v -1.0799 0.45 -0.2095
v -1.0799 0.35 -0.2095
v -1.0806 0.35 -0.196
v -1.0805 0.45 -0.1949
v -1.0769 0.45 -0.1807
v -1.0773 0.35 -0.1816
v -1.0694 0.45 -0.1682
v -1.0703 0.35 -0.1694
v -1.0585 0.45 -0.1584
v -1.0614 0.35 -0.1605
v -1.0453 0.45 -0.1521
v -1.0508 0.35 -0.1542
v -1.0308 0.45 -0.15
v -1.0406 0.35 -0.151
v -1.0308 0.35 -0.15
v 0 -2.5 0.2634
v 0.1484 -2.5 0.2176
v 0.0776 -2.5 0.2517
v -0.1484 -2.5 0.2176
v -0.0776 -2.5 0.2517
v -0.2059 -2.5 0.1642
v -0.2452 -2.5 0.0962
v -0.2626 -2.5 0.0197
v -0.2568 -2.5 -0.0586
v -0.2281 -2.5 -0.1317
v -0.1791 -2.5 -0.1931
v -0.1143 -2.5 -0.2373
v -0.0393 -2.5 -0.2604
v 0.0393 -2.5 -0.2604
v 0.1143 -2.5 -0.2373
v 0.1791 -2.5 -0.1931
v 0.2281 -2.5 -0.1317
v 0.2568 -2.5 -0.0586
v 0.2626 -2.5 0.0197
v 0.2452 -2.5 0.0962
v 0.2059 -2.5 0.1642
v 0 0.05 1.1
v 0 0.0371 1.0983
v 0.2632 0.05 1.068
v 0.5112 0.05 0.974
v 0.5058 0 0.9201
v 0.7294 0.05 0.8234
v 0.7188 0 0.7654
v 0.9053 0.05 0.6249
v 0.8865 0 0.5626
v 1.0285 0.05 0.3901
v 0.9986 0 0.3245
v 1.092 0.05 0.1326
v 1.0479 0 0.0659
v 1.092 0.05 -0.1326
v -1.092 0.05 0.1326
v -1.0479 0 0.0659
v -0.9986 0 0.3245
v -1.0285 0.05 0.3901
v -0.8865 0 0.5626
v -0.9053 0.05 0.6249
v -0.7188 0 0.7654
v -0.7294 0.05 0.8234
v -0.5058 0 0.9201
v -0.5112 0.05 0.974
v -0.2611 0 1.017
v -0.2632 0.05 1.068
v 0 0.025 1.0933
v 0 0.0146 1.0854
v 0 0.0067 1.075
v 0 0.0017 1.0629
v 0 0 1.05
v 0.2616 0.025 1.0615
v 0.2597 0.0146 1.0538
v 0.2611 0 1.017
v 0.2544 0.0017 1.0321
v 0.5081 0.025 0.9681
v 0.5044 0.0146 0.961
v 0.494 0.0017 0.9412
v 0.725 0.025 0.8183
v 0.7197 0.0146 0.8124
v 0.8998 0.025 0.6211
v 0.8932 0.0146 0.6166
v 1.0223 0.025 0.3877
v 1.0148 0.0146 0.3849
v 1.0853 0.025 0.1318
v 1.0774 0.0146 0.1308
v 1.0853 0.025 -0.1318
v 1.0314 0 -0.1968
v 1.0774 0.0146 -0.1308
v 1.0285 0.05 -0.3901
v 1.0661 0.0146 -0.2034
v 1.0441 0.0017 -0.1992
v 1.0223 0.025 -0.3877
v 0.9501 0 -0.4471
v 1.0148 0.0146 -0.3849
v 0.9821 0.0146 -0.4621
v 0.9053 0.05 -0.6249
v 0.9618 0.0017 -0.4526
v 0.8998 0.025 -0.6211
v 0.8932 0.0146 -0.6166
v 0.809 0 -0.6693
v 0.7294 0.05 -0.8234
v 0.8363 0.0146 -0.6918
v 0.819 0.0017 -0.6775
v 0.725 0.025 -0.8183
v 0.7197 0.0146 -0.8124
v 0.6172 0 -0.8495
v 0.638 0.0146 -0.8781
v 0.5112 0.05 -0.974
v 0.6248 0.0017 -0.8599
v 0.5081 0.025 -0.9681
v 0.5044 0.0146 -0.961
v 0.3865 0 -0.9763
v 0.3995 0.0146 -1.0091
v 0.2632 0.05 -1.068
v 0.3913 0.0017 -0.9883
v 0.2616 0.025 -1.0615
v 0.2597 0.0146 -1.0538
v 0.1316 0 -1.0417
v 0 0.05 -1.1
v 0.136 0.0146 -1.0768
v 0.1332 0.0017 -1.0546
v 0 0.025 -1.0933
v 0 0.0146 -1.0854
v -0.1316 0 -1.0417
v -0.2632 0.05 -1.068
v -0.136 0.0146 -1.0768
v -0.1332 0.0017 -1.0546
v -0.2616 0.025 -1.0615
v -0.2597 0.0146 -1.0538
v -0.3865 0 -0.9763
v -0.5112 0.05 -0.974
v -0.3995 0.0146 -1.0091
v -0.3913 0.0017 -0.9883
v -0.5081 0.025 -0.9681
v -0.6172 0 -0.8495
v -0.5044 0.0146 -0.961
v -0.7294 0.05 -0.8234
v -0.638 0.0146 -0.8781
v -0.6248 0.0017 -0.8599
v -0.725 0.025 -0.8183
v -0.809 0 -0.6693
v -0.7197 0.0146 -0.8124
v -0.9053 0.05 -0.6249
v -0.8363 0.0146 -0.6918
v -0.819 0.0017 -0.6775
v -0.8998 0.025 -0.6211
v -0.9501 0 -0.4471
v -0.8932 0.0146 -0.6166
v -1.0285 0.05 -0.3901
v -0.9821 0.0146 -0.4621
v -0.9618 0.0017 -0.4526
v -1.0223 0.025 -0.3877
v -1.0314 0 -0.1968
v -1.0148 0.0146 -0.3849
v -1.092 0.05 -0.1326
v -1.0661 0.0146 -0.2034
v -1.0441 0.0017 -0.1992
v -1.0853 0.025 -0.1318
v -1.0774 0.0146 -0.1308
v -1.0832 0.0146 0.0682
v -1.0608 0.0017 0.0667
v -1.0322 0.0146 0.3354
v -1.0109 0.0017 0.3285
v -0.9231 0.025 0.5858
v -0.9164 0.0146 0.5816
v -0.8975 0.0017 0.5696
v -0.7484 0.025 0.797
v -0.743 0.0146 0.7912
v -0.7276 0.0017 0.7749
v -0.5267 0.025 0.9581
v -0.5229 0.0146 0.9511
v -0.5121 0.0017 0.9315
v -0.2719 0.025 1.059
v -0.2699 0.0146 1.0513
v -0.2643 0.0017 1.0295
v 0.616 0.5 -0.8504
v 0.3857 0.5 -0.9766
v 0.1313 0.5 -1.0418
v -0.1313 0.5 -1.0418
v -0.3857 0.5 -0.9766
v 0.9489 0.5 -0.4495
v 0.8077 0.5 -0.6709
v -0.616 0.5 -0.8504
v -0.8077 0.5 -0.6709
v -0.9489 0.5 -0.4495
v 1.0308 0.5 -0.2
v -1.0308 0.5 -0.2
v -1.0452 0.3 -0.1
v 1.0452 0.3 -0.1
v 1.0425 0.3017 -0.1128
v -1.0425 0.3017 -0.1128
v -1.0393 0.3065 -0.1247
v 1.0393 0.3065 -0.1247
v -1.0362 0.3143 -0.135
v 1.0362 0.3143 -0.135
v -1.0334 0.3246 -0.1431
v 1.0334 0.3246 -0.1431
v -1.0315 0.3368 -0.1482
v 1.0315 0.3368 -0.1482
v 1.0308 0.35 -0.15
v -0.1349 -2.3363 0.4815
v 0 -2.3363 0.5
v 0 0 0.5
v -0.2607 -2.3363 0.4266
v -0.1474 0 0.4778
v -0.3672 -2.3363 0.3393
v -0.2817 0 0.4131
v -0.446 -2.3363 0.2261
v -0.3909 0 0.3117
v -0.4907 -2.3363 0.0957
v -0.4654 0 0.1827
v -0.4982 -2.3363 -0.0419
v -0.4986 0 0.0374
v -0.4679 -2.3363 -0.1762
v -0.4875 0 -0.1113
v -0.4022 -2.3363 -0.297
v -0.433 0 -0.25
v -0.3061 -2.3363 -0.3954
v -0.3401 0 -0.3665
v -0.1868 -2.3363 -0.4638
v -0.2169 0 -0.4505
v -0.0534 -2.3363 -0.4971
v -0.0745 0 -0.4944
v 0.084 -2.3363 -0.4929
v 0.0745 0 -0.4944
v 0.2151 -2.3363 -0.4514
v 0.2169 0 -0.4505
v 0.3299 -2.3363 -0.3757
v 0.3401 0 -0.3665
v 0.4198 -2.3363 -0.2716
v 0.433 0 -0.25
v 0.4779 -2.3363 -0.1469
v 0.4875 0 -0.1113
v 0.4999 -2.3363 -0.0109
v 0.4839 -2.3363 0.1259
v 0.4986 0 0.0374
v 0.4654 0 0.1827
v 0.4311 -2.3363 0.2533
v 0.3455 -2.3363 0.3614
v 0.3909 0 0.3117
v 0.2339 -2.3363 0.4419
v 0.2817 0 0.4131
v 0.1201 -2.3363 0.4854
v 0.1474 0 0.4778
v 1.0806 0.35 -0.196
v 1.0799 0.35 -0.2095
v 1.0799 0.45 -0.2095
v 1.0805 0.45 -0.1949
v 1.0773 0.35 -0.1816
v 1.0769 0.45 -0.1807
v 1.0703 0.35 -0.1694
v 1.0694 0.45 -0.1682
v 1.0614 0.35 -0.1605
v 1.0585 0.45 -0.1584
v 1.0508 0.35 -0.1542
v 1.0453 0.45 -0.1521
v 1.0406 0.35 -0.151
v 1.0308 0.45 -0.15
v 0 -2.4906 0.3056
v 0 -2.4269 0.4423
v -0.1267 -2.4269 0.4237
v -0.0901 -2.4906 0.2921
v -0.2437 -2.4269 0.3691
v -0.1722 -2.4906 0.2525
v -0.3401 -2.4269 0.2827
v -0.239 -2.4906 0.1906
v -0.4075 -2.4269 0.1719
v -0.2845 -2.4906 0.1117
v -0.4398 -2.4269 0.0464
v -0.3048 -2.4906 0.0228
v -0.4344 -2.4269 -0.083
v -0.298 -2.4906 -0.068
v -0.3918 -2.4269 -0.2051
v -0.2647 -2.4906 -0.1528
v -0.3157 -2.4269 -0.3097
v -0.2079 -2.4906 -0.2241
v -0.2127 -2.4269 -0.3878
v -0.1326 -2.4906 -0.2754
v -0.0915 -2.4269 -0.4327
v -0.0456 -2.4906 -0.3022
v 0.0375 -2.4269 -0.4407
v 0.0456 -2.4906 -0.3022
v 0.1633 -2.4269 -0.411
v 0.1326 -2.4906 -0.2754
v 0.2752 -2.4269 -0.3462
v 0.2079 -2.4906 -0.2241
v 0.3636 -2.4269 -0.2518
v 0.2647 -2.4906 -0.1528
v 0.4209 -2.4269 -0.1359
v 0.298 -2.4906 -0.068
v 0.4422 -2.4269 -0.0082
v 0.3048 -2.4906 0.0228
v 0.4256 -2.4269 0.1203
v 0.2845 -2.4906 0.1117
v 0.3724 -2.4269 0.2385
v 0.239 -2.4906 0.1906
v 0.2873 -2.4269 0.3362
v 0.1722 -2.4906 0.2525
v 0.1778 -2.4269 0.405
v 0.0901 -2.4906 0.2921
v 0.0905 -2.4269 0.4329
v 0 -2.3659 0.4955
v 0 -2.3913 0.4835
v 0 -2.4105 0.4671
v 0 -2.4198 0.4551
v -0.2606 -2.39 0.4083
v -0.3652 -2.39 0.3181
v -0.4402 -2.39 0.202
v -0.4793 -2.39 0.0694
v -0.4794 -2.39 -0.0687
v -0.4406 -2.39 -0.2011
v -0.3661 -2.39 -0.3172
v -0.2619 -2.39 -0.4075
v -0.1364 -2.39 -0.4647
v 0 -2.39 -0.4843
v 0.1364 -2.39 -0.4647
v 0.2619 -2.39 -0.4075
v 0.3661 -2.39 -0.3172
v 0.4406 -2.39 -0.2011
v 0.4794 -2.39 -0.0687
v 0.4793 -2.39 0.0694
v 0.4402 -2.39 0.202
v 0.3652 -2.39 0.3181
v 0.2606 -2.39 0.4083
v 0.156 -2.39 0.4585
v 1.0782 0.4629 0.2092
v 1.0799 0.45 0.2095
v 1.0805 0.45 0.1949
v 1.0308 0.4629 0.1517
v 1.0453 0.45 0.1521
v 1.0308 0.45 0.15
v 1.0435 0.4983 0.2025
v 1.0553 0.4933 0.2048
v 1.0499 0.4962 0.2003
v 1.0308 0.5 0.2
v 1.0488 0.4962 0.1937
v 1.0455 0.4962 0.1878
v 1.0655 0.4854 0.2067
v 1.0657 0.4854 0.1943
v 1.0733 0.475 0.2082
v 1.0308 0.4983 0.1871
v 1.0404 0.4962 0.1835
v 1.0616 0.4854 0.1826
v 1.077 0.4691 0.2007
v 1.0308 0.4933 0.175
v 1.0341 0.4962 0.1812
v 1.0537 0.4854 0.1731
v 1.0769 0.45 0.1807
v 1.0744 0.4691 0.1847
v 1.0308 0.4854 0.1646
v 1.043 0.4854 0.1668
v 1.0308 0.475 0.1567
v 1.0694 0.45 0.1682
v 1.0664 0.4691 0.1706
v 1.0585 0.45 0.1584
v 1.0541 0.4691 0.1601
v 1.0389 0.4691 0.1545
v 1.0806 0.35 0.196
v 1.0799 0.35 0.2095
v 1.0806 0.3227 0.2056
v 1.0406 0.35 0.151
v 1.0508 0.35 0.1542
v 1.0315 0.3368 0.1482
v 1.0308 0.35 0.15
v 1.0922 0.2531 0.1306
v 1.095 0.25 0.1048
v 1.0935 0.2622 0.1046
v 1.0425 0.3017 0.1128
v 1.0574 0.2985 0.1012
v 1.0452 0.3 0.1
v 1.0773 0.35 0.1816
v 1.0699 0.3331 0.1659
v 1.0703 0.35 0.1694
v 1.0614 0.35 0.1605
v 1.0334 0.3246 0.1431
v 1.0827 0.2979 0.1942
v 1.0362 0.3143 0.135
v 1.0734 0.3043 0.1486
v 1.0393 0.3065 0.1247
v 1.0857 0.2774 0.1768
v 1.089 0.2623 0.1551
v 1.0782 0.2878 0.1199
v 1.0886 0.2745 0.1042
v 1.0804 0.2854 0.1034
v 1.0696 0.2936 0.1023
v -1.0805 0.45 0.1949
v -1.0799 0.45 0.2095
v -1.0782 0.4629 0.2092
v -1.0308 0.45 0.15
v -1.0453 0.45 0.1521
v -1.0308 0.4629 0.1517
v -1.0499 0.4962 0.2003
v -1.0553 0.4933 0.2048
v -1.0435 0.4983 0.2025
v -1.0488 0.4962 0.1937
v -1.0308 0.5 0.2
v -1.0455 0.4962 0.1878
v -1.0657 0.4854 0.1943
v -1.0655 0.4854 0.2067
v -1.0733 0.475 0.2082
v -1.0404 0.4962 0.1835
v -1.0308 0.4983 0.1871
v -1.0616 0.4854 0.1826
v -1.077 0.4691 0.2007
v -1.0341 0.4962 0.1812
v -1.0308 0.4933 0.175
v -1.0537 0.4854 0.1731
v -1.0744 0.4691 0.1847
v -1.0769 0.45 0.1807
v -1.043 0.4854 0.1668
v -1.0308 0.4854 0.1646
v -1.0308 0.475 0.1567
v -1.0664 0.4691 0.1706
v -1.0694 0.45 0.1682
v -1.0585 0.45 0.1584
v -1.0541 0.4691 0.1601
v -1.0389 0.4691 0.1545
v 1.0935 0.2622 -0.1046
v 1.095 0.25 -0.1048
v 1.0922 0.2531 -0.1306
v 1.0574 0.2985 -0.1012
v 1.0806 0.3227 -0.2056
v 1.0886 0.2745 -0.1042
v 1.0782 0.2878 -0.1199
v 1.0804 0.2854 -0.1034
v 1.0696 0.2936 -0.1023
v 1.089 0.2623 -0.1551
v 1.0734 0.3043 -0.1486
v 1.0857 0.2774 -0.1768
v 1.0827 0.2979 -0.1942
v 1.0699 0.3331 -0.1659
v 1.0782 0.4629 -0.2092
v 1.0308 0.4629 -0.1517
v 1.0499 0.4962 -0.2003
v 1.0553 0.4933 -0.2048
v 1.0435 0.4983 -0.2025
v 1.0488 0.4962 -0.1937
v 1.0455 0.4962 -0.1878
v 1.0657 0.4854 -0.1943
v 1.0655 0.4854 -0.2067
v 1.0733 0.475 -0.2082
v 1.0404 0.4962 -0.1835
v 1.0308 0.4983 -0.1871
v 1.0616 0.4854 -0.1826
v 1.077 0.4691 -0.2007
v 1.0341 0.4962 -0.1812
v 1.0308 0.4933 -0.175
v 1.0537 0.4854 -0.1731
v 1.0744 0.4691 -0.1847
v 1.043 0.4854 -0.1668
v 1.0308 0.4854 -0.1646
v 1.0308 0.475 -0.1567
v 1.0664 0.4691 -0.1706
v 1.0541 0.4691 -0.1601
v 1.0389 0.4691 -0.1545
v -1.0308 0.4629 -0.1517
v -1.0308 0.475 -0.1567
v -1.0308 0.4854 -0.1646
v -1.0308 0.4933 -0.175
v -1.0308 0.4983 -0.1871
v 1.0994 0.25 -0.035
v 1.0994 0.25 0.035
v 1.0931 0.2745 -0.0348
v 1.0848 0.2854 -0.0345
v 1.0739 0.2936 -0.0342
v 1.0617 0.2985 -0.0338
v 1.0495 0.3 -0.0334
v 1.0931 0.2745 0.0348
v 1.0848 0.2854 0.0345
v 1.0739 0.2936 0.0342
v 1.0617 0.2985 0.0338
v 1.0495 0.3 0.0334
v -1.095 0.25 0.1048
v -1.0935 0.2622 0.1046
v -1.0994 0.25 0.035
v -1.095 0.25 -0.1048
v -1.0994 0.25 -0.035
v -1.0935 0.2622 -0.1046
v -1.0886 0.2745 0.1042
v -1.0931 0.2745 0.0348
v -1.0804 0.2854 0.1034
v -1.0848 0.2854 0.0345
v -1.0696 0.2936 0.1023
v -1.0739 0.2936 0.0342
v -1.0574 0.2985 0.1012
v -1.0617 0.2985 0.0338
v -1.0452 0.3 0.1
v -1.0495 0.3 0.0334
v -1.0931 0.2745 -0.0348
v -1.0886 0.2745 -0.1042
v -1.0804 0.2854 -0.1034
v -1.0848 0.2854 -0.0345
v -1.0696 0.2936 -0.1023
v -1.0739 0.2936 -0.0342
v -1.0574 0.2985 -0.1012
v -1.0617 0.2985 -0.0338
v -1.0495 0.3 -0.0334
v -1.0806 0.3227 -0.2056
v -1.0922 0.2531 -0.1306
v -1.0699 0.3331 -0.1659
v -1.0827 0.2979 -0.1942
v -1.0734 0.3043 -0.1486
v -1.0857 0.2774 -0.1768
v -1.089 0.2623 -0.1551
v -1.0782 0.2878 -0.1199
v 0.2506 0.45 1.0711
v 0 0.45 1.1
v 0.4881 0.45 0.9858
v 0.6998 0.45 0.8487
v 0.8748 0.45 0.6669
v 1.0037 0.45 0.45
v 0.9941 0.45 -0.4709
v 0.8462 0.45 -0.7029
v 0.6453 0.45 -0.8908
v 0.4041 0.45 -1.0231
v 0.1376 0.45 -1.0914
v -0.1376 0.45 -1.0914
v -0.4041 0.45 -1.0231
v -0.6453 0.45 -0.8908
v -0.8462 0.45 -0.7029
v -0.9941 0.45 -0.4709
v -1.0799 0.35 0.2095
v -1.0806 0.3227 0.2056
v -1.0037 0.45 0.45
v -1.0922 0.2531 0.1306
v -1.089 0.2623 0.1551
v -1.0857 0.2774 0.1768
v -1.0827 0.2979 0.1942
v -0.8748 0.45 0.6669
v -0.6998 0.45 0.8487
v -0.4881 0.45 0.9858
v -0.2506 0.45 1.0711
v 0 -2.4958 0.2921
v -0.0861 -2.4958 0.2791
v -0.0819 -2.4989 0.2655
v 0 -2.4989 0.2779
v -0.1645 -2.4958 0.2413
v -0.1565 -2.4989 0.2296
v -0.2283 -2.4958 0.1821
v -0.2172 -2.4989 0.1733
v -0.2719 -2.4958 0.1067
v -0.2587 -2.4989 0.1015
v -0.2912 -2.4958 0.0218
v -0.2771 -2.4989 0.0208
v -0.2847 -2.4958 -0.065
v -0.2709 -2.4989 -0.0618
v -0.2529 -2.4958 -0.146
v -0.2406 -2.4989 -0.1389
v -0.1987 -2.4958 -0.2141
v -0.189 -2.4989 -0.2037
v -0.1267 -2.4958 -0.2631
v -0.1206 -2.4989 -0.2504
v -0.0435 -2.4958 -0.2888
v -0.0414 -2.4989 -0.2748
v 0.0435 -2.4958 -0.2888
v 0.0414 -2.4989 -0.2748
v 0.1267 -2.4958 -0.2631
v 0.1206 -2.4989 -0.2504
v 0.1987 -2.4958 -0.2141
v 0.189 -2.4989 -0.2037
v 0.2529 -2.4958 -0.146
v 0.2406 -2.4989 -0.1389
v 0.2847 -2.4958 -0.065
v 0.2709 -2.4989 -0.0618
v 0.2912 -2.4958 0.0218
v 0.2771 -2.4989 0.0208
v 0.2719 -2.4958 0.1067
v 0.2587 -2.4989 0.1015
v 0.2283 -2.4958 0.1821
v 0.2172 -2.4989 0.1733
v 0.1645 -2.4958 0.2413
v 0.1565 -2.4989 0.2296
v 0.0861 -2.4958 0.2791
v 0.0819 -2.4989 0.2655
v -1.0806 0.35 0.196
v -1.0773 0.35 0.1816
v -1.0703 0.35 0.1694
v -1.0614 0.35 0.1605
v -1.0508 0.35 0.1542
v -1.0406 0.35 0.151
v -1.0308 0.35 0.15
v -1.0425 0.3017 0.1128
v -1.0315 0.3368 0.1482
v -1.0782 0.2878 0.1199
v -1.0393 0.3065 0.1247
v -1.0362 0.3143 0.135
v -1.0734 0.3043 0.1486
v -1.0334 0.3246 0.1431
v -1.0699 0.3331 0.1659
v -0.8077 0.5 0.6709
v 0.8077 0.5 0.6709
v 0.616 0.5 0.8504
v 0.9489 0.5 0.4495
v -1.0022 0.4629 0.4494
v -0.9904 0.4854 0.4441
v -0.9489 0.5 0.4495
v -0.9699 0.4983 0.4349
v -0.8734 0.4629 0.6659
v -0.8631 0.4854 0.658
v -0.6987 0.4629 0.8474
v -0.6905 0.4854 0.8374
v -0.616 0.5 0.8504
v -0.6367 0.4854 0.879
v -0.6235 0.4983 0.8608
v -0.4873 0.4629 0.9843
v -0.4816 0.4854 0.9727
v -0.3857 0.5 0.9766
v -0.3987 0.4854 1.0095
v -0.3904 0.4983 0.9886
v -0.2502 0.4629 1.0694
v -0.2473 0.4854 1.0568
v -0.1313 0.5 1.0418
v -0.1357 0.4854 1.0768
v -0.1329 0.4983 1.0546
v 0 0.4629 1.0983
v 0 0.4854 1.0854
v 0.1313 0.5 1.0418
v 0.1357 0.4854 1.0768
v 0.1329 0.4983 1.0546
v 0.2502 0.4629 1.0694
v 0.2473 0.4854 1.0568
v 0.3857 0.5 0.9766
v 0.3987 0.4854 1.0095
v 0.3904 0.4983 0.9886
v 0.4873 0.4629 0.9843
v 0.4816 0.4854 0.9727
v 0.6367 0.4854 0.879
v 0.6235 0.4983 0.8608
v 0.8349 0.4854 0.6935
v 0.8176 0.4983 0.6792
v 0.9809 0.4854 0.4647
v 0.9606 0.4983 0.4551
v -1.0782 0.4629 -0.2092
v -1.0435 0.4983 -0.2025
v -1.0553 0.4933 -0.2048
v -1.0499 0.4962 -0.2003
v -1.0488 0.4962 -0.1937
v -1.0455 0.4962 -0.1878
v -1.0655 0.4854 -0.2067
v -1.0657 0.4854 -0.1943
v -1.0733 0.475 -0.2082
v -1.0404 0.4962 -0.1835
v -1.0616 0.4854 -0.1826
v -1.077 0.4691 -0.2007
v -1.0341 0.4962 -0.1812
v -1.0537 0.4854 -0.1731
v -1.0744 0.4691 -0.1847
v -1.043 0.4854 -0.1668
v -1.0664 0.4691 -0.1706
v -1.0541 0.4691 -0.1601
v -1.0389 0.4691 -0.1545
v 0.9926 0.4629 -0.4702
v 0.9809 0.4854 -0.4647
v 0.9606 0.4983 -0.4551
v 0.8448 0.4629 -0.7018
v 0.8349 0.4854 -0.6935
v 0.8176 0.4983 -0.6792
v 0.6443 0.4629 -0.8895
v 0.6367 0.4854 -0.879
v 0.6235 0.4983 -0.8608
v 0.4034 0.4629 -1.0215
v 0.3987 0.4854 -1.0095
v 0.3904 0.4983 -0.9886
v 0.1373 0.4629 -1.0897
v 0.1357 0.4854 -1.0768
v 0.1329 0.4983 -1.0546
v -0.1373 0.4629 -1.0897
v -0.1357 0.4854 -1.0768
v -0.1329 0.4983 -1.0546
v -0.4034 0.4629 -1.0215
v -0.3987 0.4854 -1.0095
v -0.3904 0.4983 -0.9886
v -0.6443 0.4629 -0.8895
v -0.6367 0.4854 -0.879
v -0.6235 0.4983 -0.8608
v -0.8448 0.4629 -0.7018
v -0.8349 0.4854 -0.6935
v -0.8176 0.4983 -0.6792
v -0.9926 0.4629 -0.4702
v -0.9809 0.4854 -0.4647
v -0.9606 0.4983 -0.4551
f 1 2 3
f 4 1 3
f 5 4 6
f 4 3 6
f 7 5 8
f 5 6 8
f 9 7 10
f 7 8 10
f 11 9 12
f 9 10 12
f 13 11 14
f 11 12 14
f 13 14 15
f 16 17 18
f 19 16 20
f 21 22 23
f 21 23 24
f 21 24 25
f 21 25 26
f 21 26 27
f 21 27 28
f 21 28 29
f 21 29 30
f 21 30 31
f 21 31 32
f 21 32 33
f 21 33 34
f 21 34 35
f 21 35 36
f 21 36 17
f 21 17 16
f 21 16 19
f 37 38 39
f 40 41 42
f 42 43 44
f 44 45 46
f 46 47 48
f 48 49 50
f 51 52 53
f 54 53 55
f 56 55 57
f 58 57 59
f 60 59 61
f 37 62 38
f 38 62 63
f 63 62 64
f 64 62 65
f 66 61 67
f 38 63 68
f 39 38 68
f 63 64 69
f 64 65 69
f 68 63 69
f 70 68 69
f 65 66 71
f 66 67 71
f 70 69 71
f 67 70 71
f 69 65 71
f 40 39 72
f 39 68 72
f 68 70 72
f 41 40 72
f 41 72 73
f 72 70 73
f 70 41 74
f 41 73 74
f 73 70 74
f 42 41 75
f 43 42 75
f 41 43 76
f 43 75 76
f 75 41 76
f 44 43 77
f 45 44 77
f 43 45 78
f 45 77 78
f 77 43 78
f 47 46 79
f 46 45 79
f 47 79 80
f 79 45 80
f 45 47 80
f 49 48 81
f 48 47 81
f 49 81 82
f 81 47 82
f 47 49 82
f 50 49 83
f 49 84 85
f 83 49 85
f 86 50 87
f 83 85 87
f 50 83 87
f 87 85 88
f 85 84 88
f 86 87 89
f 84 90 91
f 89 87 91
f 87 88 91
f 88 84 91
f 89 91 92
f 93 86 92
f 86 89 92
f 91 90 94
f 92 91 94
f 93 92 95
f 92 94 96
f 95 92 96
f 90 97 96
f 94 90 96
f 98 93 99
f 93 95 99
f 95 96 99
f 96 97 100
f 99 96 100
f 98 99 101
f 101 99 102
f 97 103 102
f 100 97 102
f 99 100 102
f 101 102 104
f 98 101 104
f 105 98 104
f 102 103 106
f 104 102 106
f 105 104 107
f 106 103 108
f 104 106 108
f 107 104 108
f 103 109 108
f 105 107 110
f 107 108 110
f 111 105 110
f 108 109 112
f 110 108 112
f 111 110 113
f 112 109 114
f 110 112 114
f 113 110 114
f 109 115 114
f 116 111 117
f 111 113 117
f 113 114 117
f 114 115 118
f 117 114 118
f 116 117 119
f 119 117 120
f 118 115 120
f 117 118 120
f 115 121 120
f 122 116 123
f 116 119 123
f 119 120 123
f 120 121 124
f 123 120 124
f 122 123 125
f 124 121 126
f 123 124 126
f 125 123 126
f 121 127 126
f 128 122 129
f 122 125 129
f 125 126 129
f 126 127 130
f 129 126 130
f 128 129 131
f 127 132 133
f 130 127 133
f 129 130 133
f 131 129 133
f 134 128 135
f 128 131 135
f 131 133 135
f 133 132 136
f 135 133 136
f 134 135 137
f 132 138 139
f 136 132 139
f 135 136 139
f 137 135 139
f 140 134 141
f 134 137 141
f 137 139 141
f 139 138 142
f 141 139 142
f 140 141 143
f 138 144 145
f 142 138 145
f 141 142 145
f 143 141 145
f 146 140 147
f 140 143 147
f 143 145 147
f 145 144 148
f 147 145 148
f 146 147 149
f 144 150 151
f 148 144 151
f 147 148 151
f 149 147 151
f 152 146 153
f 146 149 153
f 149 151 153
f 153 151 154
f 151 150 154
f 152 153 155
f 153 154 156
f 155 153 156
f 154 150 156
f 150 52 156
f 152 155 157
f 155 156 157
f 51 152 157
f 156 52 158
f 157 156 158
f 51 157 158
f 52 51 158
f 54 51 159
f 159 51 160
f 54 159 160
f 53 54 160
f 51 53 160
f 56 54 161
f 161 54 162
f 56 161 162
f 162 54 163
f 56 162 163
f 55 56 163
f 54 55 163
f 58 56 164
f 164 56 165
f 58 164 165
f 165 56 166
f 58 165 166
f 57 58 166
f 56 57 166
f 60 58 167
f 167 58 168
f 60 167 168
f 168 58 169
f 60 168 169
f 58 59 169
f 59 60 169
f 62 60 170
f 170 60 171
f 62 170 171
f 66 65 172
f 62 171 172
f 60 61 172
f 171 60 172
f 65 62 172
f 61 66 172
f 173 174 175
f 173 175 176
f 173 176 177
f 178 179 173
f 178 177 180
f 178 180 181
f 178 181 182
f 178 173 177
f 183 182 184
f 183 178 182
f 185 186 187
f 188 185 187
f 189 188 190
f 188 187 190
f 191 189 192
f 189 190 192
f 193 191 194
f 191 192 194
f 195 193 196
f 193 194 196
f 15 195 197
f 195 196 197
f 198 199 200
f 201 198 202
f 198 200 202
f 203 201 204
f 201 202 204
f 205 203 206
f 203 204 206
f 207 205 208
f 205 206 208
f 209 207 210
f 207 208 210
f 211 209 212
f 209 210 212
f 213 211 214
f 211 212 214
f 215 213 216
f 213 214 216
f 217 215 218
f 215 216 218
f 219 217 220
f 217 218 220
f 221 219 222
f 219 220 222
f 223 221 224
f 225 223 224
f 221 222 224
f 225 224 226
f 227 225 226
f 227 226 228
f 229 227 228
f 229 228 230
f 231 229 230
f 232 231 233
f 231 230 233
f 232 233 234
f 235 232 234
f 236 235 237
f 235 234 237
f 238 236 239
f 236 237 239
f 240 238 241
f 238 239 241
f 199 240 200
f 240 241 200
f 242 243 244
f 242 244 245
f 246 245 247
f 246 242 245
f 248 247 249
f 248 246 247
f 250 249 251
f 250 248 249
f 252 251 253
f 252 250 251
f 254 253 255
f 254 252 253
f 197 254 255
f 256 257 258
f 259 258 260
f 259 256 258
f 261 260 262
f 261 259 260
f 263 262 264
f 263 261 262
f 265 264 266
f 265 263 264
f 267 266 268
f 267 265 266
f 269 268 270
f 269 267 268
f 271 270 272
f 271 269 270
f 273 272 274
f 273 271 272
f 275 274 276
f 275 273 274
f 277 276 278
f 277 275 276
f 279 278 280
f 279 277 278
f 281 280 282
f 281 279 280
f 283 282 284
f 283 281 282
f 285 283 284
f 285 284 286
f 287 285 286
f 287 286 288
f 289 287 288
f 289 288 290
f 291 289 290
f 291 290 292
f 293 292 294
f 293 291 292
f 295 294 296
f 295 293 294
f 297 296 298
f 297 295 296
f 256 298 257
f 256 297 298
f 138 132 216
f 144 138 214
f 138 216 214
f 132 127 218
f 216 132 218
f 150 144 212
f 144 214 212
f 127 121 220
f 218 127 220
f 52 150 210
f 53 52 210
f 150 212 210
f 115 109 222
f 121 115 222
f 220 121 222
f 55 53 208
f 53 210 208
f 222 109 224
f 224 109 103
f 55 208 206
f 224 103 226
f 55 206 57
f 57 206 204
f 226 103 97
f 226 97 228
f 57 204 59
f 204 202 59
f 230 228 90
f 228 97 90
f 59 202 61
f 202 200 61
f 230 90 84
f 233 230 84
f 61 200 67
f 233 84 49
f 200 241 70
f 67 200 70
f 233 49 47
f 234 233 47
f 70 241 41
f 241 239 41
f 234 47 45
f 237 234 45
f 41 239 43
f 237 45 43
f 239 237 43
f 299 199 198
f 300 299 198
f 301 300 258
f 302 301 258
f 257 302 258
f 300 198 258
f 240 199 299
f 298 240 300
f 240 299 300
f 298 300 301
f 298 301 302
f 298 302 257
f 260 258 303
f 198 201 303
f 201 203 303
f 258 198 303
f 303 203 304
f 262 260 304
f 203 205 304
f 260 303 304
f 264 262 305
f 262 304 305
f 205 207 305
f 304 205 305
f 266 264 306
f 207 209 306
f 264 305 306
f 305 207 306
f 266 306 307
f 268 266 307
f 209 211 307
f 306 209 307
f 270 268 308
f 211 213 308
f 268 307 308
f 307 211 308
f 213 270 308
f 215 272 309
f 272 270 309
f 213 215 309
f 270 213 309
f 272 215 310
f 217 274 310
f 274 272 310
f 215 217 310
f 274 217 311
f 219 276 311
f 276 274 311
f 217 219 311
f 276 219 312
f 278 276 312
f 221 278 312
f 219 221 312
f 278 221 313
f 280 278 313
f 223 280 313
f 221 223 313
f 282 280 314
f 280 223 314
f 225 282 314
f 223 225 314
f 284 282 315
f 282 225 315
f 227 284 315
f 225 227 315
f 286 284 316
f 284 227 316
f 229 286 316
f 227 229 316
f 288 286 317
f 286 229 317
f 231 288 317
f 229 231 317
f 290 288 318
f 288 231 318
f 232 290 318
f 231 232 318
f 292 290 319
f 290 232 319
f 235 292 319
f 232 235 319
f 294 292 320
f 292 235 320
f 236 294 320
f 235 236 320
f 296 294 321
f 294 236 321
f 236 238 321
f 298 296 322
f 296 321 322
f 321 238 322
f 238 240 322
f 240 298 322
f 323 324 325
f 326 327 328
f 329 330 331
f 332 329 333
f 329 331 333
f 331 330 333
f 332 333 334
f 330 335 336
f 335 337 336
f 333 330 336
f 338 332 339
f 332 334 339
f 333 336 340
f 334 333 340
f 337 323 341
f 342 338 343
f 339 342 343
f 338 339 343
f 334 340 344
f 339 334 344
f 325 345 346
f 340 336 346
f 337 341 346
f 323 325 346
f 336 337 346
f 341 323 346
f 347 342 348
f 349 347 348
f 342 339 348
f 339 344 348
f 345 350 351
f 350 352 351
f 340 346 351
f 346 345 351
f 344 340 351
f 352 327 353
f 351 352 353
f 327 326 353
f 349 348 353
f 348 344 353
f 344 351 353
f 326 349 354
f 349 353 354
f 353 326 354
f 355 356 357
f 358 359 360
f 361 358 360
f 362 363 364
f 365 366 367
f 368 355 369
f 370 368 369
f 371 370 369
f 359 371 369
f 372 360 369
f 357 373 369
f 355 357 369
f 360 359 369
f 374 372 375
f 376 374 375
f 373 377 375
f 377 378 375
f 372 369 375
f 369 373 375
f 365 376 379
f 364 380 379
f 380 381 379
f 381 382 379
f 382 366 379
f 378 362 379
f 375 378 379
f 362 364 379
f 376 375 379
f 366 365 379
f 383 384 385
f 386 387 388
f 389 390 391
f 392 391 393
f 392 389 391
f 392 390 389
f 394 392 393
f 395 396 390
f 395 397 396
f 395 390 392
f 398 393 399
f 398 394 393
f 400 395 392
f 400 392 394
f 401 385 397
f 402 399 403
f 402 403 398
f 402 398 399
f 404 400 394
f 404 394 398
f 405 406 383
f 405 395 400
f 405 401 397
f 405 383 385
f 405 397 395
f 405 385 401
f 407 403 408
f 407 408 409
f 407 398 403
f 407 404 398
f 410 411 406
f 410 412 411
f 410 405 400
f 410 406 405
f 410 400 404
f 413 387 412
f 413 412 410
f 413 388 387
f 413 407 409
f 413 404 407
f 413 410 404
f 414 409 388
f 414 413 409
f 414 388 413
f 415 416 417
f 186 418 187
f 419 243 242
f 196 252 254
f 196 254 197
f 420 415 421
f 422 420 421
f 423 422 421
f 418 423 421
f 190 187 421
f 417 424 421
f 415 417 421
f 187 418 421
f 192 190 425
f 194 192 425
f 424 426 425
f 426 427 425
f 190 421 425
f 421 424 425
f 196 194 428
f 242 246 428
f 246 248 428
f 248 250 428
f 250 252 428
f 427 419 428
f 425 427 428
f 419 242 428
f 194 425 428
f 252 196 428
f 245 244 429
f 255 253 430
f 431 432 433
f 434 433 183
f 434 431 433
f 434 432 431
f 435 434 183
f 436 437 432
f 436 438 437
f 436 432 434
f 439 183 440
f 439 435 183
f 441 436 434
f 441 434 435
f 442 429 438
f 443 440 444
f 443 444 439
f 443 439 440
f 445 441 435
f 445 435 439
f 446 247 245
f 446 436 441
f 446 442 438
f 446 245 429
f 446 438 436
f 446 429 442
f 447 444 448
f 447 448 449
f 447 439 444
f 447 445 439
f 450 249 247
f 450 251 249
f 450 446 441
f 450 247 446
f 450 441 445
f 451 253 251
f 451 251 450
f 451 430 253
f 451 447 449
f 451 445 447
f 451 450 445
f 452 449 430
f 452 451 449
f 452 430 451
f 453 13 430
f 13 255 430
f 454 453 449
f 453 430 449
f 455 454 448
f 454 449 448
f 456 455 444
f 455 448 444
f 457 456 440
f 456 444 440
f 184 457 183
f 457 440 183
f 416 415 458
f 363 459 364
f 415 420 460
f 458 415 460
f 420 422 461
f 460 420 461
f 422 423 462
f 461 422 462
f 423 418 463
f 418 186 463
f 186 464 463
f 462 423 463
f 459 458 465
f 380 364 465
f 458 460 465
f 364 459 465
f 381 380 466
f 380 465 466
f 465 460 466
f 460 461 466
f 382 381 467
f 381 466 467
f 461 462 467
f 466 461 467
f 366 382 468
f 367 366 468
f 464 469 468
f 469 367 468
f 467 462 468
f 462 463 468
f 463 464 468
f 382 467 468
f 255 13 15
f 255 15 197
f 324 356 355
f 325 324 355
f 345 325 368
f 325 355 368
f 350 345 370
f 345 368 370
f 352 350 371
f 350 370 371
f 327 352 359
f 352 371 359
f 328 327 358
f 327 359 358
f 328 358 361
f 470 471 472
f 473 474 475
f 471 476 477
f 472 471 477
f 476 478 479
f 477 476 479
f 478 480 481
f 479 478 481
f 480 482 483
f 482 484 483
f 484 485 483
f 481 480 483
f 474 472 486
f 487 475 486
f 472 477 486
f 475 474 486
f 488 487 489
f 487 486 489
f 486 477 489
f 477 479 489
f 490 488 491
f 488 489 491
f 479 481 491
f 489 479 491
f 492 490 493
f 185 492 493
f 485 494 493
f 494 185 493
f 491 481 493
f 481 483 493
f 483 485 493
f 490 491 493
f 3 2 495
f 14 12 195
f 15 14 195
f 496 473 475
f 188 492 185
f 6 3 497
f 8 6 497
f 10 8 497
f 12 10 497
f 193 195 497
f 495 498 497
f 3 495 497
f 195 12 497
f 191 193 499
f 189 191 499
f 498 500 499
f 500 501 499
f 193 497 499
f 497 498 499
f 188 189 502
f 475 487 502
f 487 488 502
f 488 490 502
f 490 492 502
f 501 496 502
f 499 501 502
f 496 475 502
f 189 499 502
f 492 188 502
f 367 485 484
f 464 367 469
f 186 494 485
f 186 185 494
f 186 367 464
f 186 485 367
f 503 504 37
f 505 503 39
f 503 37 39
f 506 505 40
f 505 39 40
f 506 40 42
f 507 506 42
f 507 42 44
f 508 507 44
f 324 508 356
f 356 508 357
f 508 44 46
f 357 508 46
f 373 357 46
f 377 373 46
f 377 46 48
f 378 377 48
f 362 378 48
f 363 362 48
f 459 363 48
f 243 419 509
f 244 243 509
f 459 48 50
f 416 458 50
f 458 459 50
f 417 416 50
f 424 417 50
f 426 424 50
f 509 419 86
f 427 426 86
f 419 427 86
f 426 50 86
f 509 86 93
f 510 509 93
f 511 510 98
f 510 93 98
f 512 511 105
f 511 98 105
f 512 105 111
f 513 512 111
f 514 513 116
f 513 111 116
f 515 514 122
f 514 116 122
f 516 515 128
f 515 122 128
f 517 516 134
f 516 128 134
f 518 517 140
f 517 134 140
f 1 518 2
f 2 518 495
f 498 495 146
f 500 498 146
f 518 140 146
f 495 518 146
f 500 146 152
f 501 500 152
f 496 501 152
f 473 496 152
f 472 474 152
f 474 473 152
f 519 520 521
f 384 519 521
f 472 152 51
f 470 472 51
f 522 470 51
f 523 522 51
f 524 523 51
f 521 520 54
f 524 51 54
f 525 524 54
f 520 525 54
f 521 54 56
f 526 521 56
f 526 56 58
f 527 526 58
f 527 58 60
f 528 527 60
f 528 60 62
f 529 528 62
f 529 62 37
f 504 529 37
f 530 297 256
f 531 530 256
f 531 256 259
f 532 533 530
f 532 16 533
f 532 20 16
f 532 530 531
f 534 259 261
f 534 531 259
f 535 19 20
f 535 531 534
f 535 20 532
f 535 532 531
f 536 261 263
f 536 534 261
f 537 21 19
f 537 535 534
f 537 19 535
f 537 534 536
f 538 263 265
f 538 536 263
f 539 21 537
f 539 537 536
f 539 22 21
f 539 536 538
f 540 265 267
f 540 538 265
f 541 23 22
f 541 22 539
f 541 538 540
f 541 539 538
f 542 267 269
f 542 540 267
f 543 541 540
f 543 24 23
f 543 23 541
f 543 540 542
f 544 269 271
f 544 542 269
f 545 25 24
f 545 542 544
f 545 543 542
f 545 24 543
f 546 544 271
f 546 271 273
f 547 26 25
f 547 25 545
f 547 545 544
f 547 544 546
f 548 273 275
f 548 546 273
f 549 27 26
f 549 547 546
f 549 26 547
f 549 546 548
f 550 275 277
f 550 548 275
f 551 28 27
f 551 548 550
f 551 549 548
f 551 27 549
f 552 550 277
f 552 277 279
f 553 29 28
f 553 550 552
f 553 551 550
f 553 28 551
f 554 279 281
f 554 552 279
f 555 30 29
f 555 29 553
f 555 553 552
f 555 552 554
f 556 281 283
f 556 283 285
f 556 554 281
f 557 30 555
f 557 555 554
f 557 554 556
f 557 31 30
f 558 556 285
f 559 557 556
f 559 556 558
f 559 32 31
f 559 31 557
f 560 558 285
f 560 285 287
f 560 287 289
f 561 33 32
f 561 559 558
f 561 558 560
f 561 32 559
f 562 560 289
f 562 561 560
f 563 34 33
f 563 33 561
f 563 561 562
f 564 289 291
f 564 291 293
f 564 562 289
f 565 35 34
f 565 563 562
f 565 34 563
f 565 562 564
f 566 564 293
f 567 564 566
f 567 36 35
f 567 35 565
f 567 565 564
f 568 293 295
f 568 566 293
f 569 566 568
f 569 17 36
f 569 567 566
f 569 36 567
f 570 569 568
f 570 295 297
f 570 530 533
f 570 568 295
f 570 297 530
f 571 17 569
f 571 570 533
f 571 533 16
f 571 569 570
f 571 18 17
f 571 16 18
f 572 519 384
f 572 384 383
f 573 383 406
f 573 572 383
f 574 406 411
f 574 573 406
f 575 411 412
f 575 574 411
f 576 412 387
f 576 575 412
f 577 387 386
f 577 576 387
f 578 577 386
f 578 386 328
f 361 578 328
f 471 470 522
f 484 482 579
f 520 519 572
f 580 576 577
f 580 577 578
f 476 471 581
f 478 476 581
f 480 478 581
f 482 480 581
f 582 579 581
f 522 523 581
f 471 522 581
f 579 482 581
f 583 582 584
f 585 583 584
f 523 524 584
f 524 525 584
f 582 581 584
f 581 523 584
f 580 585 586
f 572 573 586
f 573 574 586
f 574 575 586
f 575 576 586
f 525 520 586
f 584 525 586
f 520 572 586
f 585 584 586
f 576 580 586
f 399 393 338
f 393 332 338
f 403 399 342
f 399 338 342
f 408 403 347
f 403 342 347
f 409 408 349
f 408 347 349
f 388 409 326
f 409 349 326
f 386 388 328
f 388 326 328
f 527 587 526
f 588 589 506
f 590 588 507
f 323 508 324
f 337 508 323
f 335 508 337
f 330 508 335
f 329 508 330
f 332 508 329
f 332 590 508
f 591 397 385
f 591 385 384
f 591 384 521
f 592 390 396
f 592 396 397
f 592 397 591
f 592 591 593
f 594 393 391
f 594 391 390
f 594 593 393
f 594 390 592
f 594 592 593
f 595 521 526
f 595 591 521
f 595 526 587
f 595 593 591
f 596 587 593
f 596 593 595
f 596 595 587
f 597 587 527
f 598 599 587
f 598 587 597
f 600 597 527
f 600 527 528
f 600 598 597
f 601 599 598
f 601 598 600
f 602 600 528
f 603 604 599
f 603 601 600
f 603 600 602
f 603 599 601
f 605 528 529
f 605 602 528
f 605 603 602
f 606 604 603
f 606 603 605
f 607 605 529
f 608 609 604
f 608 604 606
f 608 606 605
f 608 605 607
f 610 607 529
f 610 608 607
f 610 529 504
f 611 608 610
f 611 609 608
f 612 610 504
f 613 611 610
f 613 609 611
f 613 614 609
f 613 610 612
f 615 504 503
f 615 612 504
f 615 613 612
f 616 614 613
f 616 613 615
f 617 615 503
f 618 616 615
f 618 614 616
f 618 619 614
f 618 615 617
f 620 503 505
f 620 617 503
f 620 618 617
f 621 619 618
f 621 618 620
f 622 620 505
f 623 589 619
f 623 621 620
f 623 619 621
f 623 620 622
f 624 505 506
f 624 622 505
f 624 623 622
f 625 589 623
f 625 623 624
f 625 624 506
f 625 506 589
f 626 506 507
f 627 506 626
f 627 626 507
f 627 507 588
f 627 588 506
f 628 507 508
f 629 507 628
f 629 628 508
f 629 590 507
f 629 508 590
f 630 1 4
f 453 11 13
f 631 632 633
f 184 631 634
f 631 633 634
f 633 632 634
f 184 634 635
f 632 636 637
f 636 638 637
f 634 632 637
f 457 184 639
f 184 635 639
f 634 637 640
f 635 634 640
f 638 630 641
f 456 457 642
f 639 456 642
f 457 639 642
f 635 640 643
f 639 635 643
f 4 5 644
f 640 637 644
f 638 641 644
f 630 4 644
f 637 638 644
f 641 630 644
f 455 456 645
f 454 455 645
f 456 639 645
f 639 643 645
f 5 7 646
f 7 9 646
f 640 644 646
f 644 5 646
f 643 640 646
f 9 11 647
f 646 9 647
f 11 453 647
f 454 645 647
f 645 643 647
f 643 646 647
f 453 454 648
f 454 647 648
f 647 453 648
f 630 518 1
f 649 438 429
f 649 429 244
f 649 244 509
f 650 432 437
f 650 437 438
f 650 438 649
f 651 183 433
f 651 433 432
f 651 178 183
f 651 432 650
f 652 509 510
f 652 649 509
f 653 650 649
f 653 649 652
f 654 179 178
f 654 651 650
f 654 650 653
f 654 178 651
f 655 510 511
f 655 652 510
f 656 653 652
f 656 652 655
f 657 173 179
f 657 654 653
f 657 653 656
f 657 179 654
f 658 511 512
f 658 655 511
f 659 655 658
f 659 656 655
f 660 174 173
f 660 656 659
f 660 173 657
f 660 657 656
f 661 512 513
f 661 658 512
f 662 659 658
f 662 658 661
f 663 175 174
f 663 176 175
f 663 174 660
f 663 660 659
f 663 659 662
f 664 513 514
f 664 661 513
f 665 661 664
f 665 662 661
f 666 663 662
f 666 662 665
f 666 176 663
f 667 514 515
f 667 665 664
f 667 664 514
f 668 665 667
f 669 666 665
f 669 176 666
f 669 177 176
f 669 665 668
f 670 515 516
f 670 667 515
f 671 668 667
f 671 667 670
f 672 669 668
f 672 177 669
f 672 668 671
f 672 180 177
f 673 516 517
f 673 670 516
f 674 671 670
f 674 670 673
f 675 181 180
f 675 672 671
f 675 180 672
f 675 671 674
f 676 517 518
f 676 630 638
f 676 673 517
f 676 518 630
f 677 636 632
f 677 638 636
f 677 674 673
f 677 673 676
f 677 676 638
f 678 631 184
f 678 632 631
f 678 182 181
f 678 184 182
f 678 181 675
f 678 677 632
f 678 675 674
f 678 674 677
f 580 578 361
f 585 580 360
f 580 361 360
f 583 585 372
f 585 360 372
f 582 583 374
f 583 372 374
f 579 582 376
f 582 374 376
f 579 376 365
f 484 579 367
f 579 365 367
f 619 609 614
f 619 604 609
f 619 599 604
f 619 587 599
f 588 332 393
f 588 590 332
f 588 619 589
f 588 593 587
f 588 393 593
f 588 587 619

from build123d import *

# Parameters (mm, degrees)
SKETCH1_R           = 1.1
BOSS_EXTRUDE1_DEPTH = 0.5
SKETCH2_W           = 2.844413099
SKETCH2_H           = 0.3
CUT_EXTRUDE1_DEPTH  = 0.2
FILLET1_R           = 0.05
SKETCH3_R           = 0.5
BOSS_EXTRUDE2_DEPTH = 2.5
CHAMFER1_SIZE       = 0.1
CHAMFER1_SIZE2      = 0.214450692
FILLET2_R           = 0.1


with BuildPart() as part:
    # Sketch1 → Boss-Extrude1 (new body)
    with BuildSketch(Plane(origin=(0, 0, 0), x_dir=(1, 0, 0), z_dir=(0, 1, 0))):
        with Locations(Location((0, 0, 0), (0, 0, 270))):
            Circle(SKETCH1_R)
    extrude(amount=BOSS_EXTRUDE1_DEPTH)

    # Sketch2 → Cut-Extrude1 (cut)
    with BuildSketch(Plane(origin=(0, 0.5, 0), x_dir=(1, 0, 0), z_dir=(0, 1, 0))):
        with Locations((0.027526578, 0)):
            Rectangle(SKETCH2_W, SKETCH2_H)
    extrude(amount=-CUT_EXTRUDE1_DEPTH, mode=Mode.SUBTRACT)

    # Fillet1
    fillet1_edges = [part.edges().sort_by_distance(p)[0] for p in [
        (1.089724736, 0.4, -0.15),
        (0, 0.3, -0.15),
        (-1.089724736, 0.4, -0.15),
        (-1.089724736, 0.4, 0.15),
        (0, 0.3, 0.15),
        (1.089724736, 0.4, 0.15),
        (0, 0, -1.1),
        (0, 0.5, -1.1),
        (0.722841615, 0.5, 0.829156198),
        (0, 0.5, 0.15),
        (0, 0.5, -0.15),
        (-1.1, 0.3, 0),
        (1.1, 0.3, 0),
    ]]
    fillet(fillet1_edges, radius=FILLET1_R)

    # Sketch3 → Boss-Extrude2 (add)
    with BuildSketch(Plane.XZ):
        with Locations(Location((0, 0, 0), (0, 0, 90))):
            Circle(SKETCH3_R)
    extrude(amount=BOSS_EXTRUDE2_DEPTH)

    # Chamfer1
    chamfer1_edges = [part.edges().sort_by_distance(p)[0] for p in [
        (0, -2.5, -0.5),
    ]]
    chamfer1_side = [part.faces().sort_by_distance(p)[0] for p in [
        (0, -1.25, -0.5),
    ]]
    chamfer(chamfer1_edges, length=CHAMFER1_SIZE, length2=CHAMFER1_SIZE2, reference=chamfer1_side[0])

    # Fillet2
    fillet2_edges = [part.edges().sort_by_distance(p)[0] for p in [
        (0, -2.5, -0.285549308),
        (0, -2.4, -0.5),
    ]]
    fillet(fillet2_edges, radius=FILLET2_R)


solid = part.part
